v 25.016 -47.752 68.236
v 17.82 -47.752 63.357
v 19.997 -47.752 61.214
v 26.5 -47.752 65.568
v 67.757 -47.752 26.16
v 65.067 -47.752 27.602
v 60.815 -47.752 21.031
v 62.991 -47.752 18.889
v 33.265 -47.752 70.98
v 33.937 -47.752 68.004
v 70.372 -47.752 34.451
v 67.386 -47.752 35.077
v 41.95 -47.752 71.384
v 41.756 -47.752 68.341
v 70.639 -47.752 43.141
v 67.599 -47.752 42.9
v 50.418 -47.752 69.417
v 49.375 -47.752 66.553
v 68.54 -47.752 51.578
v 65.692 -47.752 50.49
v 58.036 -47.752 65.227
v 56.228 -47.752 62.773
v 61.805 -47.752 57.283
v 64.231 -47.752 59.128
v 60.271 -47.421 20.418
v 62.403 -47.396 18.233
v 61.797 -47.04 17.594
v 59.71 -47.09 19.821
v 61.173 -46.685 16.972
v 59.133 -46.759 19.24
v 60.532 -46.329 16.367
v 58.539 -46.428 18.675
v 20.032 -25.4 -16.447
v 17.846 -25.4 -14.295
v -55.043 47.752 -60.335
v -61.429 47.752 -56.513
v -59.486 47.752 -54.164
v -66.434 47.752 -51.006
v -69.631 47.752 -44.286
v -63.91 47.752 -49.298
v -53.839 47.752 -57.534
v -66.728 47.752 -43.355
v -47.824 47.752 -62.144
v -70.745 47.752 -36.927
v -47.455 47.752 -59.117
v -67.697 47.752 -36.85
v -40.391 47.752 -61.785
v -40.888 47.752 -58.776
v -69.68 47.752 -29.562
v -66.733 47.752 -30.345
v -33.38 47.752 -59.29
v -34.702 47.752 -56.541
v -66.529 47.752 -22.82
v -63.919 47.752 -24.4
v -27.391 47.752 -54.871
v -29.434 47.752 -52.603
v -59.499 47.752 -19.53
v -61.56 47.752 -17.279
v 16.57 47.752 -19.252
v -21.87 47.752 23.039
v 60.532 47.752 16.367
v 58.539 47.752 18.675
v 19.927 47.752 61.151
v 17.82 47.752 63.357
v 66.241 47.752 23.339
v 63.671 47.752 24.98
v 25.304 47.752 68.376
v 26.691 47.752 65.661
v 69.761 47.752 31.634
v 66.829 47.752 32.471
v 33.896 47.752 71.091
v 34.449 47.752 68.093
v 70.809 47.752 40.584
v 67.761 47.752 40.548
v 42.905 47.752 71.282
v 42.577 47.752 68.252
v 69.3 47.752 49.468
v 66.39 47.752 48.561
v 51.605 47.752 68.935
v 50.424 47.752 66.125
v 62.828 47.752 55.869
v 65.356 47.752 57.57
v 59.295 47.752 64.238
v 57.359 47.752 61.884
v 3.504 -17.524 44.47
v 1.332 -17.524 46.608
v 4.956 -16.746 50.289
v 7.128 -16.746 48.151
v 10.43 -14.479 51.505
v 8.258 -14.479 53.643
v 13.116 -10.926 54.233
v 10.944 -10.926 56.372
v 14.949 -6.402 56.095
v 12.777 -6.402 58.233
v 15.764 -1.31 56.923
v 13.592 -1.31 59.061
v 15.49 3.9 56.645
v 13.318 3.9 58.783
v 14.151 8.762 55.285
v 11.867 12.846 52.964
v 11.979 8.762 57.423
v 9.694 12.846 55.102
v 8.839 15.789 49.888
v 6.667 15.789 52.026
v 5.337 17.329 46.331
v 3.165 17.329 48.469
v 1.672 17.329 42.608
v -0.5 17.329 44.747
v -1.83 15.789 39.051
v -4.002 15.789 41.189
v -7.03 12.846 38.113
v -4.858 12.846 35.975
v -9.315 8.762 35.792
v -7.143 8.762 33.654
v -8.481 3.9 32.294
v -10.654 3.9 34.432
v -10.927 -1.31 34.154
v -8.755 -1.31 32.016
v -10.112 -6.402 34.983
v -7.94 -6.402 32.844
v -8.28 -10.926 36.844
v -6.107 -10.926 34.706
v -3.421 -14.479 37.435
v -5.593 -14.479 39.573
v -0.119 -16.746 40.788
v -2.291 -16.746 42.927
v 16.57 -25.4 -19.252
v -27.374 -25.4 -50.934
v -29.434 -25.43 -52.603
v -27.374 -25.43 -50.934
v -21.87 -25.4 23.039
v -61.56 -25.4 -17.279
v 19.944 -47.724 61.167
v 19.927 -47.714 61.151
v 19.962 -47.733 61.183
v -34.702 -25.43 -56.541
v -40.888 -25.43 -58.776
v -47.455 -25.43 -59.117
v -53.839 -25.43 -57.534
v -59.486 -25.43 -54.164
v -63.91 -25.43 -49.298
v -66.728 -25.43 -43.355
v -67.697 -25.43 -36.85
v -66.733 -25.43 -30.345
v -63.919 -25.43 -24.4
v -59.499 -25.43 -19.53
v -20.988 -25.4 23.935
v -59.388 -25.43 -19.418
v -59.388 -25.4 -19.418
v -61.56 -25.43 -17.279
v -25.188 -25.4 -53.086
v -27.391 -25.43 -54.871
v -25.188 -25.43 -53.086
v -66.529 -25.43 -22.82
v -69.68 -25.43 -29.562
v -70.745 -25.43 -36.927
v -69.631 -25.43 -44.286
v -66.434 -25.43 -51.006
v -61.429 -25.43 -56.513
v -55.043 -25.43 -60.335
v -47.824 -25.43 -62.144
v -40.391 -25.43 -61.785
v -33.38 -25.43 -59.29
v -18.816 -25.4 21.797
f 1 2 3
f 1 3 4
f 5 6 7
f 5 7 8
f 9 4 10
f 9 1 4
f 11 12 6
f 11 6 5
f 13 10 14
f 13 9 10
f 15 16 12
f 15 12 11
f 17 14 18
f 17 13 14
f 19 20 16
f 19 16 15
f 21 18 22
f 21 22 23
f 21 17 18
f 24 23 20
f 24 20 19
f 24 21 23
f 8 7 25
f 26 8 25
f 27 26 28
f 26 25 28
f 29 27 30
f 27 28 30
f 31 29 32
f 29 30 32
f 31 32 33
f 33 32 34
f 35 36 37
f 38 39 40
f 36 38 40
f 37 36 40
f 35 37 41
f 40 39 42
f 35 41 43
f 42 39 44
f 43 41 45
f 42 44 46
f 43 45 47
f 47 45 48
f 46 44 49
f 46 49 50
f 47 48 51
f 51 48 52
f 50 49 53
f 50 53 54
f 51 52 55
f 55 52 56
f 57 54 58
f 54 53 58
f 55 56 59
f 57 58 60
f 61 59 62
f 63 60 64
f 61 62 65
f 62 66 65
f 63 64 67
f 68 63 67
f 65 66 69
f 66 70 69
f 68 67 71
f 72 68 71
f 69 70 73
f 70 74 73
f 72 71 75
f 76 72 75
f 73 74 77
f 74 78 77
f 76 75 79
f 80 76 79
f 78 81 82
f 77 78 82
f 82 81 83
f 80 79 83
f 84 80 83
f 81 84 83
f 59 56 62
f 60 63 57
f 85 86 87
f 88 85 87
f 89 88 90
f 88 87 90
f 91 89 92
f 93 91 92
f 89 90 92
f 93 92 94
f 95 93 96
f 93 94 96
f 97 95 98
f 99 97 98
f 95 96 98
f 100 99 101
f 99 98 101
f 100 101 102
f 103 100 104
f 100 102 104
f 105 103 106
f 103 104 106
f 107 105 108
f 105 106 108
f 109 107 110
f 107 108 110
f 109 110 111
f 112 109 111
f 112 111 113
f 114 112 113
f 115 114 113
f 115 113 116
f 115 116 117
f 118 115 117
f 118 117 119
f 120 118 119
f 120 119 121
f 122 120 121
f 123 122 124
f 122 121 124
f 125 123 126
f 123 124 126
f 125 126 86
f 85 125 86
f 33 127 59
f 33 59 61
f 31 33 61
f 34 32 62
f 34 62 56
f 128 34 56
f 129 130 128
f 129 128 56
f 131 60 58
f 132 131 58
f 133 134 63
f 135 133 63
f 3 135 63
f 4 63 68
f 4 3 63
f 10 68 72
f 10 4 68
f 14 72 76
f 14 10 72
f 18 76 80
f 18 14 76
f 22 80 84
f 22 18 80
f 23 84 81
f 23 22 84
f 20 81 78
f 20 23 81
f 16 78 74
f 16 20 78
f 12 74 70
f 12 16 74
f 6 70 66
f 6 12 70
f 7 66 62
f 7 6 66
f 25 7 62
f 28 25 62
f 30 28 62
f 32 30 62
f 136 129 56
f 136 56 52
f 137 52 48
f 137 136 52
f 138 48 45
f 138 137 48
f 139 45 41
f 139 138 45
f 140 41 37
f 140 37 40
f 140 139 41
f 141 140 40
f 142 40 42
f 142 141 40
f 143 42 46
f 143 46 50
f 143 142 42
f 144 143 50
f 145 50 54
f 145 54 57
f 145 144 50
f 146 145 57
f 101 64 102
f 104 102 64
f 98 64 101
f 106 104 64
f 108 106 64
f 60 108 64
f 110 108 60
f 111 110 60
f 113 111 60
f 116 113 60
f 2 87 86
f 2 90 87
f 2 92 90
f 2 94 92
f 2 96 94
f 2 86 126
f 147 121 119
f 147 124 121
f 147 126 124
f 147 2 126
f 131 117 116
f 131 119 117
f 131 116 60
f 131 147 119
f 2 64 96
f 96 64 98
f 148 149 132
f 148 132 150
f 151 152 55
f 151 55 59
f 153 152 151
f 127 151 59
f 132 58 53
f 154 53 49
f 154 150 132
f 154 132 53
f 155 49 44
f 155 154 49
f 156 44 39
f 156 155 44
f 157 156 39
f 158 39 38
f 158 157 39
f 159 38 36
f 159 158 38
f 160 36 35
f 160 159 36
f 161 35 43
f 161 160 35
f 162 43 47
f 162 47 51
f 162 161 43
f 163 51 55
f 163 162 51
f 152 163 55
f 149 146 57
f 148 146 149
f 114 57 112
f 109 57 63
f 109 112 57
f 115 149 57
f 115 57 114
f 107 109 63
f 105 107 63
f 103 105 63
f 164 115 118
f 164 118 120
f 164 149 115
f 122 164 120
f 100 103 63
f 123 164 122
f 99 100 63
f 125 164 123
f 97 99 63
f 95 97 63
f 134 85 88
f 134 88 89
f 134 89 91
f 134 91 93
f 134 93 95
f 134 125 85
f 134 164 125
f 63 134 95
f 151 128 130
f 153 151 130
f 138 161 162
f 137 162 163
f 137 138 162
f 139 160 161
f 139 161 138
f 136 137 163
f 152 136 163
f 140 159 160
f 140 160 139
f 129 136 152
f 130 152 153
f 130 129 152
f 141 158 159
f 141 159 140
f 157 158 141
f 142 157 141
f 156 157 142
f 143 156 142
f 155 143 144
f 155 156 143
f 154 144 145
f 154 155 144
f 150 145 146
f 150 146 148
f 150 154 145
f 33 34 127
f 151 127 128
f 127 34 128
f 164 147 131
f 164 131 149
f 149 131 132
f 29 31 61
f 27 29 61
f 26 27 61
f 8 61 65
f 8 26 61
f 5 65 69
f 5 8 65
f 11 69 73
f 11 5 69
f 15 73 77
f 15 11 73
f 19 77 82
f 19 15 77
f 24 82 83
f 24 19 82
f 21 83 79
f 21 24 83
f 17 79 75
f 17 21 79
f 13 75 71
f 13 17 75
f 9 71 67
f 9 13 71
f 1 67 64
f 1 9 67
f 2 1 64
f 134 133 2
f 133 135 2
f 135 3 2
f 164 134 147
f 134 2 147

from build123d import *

# Parameters (mm, degrees)
F1_DEPTH = 47.752
F3_DEPTH = 125.8997323481
F5_W     = 28.5765696317
F5_H     = 79.3209560215
F6_DEPTH = 128.4397323481
F2_R     = 17.5244442396
F7_DEPTH = 3.0480007527


with BuildPart() as f1:
    # F0 (on Front) → F1 (new body, symmetric)
    with BuildSketch(Plane.XZ):
        with BuildLine():
            ThreePointArc((-61.5604854778, -17.279496366), (-64.1340028036, -53.9436351961), (-27.3913528199, -54.8708567219))
            Line((-27.3913528199, -54.8708567219), (16.5702632333, -19.2516883407))
            Line((16.5702632333, -19.2516883407), (14.5168037691, -16.992563549))
            Line((14.5168037691, -16.992563549), (-29.4344777615, -52.603358555))
            ThreePointArc((-29.4344777615, -52.603358555), (-61.8778750989, -51.8941968791), (-59.4991920915, -19.5303465483))
            Line((-59.4991920915, -19.5303465483), (-19.8167012668, 20.779631988))
            Line((-19.8167012668, 20.779631988), (-21.8700110068, 23.0385920597))
            Line((-21.8700110068, 23.0385920597), (-61.5604854778, -17.279496366))
        make_face()
        Polygon((14.5168037691, -16.992563549), (16.5702632333, -19.2516883407), (60.5318792866, 16.3674800405), (58.5385509124, 18.675325048), align=None)
        Polygon((17.8204634643, 63.3566804854), (-21.8700110068, 23.0385920597), (-19.8167012668, 20.779631988), (19.9267067724, 61.151491005), align=None)
        with BuildLine():
            Line((58.5385509124, 18.675325048), (60.5318792866, 16.3674800405))
            ThreePointArc((60.5318792866, 16.3674800405), (62.5637295367, 61.1204909666), (17.8204634643, 63.3566804854))
            Line((17.8204634643, 63.3566804854), (19.9267067724, 61.151491005))
            ThreePointArc((19.9267067724, 61.151491005), (60.3075985546, 59.0710562617), (58.5385509124, 18.675325048))
        make_face()
    extrude(amount=F1_DEPTH, both=True)

    # F2 (on face) → F3 (cut, through all)
    with BuildSketch(Plane(origin=(-22.624429106, 0, 22.272244566), x_dir=(0, -1, 0), z_dir=(-0.7126316385, 0, 0.7015384151))):
        Polygon((47.752, 2.3330547172), (47.752, 57.6517147172), (25.4, 2.3330547172), (25.4, -55.5009612218), (47.752, -55.5009612218), align=None)
    extrude(amount=-F3_DEPTH, mode=Mode.SUBTRACT)

    # F5 (on offset) → F6 (cut, through all)
    with BuildSketch(Plane(origin=(-24.4345134677, 0, 24.0541521404), x_dir=(0, -1, 0), z_dir=(-0.7126316385, 0, 0.7015384151))):
        with Locations((39.7184668109, -94.0875317901)):
            Rectangle(F5_W, F5_H)
    extrude(amount=-F6_DEPTH, mode=Mode.SUBTRACT)

    # F2 (on face) → F7 (cut, through all)
    with BuildSketch(Plane(origin=(-22.624429106, 0, 22.272244566), x_dir=(0, -1, 0), z_dir=(-0.7126316385, 0, 0.7015384151))):
        with Locations((0, 34.1488756239)):
            Circle(F2_R)
    extrude(amount=-F7_DEPTH, mode=Mode.SUBTRACT)


solid = f1.part
